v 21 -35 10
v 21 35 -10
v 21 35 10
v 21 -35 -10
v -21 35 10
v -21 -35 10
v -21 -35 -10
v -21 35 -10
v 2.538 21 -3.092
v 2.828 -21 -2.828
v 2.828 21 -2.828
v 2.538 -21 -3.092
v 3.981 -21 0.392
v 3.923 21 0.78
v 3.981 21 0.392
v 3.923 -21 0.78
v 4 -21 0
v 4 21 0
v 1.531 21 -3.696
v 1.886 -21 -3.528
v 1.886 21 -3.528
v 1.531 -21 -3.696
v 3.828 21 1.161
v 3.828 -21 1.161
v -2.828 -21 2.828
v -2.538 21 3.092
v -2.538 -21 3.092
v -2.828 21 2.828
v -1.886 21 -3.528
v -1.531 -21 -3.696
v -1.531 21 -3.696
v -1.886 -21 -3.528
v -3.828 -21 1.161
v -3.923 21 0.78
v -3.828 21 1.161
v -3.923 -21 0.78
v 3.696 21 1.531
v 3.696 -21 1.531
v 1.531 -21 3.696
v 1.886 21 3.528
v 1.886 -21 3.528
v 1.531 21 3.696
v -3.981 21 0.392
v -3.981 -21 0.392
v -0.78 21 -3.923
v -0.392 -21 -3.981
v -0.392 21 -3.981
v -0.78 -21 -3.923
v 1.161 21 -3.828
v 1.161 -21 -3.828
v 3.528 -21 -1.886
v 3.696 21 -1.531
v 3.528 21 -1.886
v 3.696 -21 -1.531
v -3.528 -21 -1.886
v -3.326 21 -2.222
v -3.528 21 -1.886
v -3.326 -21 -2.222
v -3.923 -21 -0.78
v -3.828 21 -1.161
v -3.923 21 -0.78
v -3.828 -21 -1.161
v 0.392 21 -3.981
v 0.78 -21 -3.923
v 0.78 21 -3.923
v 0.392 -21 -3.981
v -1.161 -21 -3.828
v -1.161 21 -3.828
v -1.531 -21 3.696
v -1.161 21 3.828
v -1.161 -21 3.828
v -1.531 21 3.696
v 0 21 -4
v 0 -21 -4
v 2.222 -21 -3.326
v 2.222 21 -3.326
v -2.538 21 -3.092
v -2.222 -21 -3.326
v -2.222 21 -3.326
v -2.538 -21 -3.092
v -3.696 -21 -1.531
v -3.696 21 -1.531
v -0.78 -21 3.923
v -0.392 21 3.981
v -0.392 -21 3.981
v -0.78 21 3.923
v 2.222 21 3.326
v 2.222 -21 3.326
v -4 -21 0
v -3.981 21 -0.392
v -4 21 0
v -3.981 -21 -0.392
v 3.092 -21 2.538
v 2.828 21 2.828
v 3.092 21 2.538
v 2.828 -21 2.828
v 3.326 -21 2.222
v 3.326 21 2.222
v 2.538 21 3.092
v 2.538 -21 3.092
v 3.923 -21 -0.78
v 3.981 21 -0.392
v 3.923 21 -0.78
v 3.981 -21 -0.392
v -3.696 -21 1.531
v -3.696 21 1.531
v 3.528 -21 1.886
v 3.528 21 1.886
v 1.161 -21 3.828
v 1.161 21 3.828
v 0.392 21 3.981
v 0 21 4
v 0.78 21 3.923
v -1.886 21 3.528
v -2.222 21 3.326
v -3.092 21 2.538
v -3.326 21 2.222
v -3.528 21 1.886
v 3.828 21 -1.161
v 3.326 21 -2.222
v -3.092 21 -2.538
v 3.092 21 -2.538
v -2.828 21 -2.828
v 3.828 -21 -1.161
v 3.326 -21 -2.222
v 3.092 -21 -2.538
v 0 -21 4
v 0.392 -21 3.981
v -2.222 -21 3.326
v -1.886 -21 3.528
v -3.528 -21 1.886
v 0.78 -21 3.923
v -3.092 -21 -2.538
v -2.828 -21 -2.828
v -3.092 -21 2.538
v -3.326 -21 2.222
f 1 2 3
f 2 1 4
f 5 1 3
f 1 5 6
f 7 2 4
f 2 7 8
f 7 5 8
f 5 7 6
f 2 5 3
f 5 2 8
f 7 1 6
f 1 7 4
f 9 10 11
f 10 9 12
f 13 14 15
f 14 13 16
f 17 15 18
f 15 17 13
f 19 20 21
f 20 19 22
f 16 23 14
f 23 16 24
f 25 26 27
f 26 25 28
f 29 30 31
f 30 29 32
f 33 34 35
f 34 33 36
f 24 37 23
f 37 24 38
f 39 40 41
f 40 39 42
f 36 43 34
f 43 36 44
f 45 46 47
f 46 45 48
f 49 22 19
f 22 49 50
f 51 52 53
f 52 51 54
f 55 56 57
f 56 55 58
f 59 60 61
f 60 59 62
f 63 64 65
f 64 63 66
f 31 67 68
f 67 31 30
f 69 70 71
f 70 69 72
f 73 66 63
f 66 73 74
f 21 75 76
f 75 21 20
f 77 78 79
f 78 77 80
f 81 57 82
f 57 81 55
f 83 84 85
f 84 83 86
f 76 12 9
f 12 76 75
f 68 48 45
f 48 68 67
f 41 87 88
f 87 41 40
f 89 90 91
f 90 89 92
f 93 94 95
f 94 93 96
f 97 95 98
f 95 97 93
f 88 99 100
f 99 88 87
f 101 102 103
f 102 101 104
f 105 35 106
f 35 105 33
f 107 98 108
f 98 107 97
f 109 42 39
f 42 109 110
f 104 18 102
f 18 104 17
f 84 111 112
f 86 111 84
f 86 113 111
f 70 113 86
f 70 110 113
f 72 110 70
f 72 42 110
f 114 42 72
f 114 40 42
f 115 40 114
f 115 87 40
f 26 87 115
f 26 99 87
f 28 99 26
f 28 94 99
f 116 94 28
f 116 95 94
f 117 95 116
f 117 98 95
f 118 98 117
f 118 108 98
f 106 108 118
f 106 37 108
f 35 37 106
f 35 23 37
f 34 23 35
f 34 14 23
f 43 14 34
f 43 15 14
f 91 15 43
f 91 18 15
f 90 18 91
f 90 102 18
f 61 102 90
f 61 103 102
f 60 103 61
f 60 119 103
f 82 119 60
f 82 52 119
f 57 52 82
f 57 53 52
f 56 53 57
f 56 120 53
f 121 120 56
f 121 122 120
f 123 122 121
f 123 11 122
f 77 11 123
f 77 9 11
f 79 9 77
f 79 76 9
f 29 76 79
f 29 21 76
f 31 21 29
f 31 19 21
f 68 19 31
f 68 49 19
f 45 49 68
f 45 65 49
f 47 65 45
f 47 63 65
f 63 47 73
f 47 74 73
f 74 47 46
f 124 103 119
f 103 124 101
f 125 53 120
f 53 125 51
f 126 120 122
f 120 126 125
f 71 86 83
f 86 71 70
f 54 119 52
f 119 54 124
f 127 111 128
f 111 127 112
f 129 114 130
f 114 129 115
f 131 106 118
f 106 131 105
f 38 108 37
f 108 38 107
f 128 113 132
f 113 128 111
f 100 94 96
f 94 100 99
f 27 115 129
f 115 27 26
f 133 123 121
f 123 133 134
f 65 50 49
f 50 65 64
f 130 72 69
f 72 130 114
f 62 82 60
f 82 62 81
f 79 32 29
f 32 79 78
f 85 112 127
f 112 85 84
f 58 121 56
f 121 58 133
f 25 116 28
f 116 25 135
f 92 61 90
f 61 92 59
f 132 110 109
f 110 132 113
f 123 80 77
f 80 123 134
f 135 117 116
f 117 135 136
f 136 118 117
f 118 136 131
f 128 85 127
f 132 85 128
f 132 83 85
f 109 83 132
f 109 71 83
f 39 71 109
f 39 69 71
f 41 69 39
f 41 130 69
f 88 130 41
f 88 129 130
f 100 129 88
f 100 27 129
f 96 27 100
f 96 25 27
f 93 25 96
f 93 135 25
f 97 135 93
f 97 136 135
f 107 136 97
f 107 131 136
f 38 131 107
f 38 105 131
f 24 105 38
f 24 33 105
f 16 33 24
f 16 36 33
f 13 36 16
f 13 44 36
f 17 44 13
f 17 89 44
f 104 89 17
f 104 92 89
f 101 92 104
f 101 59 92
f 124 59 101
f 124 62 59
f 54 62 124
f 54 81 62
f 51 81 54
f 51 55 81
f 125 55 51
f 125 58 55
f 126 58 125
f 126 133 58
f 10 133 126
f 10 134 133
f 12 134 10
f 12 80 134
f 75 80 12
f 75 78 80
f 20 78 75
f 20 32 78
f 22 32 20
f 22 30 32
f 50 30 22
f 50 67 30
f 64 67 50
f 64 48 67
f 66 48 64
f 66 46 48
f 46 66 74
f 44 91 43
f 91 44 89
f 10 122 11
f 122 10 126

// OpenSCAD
module linear_bearing_block() {
    difference() {
        // Main block
        cube([42, 70, 20], center = true);
        
        // Shaft hole
        translate([0, 0, 0])
            rotate([90, 0, 0])
            cylinder(h = 42, r = 4, center = true, $fn = 64);
    }
}

linear_bearing_block();
